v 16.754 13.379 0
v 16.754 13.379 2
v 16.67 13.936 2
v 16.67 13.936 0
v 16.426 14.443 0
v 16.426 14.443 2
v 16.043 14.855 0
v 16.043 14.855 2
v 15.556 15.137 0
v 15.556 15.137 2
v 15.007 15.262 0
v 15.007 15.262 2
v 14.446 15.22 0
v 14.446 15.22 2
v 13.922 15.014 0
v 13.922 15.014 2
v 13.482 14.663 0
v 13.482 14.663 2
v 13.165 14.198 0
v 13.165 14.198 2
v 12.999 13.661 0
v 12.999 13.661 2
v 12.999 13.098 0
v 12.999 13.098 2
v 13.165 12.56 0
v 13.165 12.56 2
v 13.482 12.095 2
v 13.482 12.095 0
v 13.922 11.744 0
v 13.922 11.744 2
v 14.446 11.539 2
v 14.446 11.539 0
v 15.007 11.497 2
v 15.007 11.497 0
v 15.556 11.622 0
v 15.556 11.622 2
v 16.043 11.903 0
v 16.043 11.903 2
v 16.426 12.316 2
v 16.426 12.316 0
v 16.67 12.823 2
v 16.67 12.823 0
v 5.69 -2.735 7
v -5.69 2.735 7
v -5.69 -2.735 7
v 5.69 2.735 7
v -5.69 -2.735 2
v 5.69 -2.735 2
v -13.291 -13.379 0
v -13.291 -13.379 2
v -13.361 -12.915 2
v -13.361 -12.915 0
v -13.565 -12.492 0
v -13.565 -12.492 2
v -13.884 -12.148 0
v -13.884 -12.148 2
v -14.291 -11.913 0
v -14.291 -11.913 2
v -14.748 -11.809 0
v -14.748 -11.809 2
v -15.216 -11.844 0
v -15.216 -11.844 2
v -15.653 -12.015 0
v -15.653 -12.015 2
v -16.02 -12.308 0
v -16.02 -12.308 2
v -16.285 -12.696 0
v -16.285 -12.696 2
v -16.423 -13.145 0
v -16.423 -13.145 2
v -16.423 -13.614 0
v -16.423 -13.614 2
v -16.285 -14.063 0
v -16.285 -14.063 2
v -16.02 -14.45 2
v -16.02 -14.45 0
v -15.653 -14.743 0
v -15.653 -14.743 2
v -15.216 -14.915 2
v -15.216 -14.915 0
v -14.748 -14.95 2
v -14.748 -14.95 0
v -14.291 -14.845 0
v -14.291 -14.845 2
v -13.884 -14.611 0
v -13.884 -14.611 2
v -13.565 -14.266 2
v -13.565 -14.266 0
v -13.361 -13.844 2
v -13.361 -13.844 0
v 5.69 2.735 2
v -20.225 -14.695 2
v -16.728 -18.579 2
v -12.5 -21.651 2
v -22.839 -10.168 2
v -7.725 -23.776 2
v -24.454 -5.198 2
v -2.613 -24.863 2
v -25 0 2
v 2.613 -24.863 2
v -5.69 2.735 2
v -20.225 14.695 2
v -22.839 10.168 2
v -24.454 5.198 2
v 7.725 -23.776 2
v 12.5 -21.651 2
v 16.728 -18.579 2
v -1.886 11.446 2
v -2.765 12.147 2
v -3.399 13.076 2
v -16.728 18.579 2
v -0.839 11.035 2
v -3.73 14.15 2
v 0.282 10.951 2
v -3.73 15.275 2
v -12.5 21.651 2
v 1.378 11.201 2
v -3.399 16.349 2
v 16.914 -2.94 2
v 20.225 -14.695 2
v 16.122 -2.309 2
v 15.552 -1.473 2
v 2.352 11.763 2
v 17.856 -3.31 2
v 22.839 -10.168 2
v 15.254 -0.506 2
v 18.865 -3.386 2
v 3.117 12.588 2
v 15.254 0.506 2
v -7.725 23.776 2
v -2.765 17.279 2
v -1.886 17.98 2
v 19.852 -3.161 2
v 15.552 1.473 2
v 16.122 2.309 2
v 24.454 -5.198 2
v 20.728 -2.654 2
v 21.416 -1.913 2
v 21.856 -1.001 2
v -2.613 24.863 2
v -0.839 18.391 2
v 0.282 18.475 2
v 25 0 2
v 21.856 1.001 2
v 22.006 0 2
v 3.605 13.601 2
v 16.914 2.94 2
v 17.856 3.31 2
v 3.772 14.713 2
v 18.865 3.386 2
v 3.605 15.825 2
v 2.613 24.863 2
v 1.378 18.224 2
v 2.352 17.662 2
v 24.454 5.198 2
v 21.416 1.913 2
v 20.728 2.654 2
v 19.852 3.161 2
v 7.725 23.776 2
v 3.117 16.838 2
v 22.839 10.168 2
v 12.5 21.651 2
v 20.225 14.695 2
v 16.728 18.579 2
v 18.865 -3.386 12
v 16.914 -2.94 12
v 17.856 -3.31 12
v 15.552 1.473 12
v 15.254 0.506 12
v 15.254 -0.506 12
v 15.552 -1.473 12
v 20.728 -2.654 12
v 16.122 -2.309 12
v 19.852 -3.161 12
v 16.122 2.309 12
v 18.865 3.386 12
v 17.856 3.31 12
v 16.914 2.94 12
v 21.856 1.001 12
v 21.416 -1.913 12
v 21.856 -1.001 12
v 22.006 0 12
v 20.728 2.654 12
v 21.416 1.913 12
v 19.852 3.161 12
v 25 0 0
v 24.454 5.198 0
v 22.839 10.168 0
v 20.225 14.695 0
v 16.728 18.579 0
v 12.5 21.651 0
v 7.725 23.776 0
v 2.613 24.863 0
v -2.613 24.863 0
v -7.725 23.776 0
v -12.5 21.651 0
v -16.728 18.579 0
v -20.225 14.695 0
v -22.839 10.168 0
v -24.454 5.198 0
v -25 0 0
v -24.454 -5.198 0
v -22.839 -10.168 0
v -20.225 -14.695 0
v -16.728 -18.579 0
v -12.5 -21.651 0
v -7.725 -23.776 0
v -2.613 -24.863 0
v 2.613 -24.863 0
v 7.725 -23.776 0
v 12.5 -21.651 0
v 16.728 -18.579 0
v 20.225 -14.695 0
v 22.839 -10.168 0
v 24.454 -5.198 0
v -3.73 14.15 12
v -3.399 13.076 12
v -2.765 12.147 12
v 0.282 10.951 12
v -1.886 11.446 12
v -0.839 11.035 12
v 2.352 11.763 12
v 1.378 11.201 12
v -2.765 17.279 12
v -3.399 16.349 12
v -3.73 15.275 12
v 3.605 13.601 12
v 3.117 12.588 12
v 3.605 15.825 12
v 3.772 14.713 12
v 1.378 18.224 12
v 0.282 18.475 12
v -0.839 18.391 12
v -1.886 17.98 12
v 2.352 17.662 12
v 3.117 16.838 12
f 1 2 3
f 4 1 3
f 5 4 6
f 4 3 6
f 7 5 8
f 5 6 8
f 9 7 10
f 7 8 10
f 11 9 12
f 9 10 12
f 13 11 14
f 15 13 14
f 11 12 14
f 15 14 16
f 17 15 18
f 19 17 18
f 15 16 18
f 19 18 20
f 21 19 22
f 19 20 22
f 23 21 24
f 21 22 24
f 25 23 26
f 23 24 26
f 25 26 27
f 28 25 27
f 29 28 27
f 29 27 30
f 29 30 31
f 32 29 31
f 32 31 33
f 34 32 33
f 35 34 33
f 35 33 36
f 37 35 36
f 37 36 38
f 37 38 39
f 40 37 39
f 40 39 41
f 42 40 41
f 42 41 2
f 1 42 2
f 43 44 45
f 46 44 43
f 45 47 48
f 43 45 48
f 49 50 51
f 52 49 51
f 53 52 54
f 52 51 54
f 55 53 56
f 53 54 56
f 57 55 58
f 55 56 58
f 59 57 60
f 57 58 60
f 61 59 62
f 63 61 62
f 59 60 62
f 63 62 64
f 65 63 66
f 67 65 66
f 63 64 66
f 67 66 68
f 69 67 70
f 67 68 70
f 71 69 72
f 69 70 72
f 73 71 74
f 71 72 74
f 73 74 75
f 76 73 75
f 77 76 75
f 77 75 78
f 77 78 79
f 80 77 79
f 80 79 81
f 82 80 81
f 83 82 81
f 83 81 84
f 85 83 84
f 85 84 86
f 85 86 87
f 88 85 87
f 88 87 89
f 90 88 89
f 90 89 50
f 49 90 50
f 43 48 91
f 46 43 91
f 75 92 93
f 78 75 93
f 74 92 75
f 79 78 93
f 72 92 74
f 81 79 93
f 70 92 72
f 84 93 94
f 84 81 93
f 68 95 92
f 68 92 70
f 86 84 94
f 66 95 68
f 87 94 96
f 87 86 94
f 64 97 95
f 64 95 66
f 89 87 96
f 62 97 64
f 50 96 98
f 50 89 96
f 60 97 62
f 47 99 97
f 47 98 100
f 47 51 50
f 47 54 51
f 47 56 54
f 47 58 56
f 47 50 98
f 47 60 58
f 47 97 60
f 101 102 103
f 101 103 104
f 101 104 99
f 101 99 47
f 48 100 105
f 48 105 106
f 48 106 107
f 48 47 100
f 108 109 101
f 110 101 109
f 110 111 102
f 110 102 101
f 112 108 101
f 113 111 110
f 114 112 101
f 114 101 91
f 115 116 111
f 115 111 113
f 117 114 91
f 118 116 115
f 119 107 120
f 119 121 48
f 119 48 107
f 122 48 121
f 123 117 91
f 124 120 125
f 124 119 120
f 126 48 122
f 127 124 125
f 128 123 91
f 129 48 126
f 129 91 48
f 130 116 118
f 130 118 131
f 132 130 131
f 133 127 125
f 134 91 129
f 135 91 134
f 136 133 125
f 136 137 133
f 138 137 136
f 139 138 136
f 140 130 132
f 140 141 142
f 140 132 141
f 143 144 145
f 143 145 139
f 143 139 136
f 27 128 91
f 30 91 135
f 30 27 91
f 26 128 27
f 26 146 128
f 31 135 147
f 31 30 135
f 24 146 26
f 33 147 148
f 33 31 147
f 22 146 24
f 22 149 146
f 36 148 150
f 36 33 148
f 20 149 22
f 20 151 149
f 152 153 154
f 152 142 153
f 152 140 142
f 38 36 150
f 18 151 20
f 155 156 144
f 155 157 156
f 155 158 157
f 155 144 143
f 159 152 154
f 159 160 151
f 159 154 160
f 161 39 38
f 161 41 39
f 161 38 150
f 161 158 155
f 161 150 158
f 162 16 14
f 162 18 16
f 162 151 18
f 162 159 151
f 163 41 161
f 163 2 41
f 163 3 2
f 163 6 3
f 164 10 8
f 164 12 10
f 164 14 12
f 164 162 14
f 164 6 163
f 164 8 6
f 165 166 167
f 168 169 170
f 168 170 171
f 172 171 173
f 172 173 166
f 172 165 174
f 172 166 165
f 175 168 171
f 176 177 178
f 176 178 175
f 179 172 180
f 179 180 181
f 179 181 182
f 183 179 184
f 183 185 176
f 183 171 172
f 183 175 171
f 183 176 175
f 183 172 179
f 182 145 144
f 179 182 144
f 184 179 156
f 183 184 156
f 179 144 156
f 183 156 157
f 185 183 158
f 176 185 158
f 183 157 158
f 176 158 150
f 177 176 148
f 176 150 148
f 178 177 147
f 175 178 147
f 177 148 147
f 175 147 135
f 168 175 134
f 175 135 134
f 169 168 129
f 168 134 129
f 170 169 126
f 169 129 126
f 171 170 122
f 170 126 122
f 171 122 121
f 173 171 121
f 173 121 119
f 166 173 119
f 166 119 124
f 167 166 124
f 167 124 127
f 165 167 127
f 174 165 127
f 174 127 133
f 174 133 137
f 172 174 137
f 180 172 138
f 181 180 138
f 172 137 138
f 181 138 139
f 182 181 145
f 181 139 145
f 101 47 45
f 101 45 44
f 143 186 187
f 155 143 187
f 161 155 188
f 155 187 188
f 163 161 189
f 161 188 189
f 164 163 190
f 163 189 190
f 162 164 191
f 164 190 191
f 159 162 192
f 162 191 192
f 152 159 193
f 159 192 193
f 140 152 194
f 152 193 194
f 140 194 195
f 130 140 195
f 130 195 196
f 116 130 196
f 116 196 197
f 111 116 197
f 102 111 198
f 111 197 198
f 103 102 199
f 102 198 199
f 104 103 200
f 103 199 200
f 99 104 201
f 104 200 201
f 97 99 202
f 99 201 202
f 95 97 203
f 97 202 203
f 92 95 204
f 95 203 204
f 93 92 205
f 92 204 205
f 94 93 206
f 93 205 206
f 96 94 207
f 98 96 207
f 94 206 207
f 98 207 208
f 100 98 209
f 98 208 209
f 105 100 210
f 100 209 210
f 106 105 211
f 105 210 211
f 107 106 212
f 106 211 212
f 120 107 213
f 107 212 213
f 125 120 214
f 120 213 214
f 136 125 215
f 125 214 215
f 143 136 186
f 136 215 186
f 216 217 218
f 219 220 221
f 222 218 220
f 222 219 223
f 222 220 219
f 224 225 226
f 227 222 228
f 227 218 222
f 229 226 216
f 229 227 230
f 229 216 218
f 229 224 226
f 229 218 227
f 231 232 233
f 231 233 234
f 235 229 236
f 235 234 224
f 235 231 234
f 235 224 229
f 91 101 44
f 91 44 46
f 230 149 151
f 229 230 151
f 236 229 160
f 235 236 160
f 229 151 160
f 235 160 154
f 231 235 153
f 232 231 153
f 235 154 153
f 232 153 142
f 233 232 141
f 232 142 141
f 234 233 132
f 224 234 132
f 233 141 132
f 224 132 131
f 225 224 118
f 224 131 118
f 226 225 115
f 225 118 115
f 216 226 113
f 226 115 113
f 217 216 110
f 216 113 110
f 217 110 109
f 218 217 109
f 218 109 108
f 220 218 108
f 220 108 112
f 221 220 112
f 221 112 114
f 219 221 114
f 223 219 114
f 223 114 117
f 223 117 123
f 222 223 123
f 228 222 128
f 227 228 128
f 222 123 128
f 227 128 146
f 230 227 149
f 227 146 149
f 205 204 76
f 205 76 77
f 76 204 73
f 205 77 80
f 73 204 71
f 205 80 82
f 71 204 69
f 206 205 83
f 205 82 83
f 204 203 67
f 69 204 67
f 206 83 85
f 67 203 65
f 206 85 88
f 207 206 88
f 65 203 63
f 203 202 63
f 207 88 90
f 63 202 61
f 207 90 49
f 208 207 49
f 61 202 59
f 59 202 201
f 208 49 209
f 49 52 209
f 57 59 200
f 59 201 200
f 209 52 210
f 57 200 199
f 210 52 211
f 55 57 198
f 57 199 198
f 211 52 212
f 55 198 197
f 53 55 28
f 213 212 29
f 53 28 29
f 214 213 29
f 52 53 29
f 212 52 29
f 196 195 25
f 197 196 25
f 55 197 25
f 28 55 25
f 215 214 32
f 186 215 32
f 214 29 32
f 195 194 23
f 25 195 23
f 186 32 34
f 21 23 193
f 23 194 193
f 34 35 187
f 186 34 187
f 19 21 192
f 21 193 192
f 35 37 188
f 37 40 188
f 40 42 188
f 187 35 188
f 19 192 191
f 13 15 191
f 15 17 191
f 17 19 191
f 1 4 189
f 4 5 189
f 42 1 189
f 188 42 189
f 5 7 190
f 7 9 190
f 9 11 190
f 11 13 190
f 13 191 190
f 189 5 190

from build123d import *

# Parameters (mm, degrees)
SKETCH1_R           = 25
BOSS_EXTRUDE1_DEPTH = 2
SKETCH2_R           = 3.772478216
SKETCH2_R_2         = 3.395230394
BOSS_EXTRUDE2_DEPTH = 10
SKETCH3_W           = 11.380817266
SKETCH3_H           = 5.470093412
BOSS_EXTRUDE3_DEPTH = 5
SKETCH4_R           = 1.574884911
SKETCH4_R_2         = 1.887966751
CUT_EXTRUDE1_DEPTH  = 5


with BuildPart() as part:
    # Sketch1 → Boss-Extrude1 (new body)
    with BuildSketch(Plane.XY):
        Circle(SKETCH1_R)
    extrude(amount=BOSS_EXTRUDE1_DEPTH)

    # Sketch2 → Boss-Extrude2 (add)
    with BuildSketch(Plane.XY.offset(2)):
        with Locations((0, 14.712665041)):
            Circle(SKETCH2_R)
        with Locations((18.611146521, 0)):
            Circle(SKETCH2_R_2)
    extrude(amount=BOSS_EXTRUDE2_DEPTH)

    # Sketch3 → Boss-Extrude3 (add)
    with BuildSketch(Plane.XY.offset(2)):
        Rectangle(SKETCH3_W, SKETCH3_H)
    extrude(amount=BOSS_EXTRUDE3_DEPTH)

    # Sketch4 → Cut-Extrude1 (cut)
    with BuildSketch(Plane.XY.offset(2)):
        with Locations((-14.865882925, -13.379294632)):
            Circle(SKETCH4_R)
        with Locations((14.865882925, 13.379294632)):
            Circle(SKETCH4_R_2)
    extrude(amount=-CUT_EXTRUDE1_DEPTH, mode=Mode.SUBTRACT)


solid = part.part
